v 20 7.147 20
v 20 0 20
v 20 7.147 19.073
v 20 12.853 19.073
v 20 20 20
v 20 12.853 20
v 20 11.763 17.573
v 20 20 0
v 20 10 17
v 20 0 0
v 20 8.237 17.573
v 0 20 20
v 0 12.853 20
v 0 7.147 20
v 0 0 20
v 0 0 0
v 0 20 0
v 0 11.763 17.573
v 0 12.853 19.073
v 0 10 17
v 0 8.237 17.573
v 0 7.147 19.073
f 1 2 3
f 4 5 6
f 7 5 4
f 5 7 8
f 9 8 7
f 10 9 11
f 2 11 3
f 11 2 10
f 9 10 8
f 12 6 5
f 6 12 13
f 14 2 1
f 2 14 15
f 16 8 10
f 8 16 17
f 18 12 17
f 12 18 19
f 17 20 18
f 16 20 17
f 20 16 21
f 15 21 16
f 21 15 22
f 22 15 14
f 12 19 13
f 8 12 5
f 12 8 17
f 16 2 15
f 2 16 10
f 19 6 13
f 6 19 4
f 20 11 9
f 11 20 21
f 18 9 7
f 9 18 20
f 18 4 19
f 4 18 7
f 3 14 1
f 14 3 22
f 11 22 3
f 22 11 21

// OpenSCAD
// The exact-geometry audit's case x04 (docs/audits/exact-geometry-rust.md).
// volume: 7717.256661176919
difference() { cube(20); translate([-1,10,20]) rotate([0,90,0]) cylinder(r=3, h=22); }
